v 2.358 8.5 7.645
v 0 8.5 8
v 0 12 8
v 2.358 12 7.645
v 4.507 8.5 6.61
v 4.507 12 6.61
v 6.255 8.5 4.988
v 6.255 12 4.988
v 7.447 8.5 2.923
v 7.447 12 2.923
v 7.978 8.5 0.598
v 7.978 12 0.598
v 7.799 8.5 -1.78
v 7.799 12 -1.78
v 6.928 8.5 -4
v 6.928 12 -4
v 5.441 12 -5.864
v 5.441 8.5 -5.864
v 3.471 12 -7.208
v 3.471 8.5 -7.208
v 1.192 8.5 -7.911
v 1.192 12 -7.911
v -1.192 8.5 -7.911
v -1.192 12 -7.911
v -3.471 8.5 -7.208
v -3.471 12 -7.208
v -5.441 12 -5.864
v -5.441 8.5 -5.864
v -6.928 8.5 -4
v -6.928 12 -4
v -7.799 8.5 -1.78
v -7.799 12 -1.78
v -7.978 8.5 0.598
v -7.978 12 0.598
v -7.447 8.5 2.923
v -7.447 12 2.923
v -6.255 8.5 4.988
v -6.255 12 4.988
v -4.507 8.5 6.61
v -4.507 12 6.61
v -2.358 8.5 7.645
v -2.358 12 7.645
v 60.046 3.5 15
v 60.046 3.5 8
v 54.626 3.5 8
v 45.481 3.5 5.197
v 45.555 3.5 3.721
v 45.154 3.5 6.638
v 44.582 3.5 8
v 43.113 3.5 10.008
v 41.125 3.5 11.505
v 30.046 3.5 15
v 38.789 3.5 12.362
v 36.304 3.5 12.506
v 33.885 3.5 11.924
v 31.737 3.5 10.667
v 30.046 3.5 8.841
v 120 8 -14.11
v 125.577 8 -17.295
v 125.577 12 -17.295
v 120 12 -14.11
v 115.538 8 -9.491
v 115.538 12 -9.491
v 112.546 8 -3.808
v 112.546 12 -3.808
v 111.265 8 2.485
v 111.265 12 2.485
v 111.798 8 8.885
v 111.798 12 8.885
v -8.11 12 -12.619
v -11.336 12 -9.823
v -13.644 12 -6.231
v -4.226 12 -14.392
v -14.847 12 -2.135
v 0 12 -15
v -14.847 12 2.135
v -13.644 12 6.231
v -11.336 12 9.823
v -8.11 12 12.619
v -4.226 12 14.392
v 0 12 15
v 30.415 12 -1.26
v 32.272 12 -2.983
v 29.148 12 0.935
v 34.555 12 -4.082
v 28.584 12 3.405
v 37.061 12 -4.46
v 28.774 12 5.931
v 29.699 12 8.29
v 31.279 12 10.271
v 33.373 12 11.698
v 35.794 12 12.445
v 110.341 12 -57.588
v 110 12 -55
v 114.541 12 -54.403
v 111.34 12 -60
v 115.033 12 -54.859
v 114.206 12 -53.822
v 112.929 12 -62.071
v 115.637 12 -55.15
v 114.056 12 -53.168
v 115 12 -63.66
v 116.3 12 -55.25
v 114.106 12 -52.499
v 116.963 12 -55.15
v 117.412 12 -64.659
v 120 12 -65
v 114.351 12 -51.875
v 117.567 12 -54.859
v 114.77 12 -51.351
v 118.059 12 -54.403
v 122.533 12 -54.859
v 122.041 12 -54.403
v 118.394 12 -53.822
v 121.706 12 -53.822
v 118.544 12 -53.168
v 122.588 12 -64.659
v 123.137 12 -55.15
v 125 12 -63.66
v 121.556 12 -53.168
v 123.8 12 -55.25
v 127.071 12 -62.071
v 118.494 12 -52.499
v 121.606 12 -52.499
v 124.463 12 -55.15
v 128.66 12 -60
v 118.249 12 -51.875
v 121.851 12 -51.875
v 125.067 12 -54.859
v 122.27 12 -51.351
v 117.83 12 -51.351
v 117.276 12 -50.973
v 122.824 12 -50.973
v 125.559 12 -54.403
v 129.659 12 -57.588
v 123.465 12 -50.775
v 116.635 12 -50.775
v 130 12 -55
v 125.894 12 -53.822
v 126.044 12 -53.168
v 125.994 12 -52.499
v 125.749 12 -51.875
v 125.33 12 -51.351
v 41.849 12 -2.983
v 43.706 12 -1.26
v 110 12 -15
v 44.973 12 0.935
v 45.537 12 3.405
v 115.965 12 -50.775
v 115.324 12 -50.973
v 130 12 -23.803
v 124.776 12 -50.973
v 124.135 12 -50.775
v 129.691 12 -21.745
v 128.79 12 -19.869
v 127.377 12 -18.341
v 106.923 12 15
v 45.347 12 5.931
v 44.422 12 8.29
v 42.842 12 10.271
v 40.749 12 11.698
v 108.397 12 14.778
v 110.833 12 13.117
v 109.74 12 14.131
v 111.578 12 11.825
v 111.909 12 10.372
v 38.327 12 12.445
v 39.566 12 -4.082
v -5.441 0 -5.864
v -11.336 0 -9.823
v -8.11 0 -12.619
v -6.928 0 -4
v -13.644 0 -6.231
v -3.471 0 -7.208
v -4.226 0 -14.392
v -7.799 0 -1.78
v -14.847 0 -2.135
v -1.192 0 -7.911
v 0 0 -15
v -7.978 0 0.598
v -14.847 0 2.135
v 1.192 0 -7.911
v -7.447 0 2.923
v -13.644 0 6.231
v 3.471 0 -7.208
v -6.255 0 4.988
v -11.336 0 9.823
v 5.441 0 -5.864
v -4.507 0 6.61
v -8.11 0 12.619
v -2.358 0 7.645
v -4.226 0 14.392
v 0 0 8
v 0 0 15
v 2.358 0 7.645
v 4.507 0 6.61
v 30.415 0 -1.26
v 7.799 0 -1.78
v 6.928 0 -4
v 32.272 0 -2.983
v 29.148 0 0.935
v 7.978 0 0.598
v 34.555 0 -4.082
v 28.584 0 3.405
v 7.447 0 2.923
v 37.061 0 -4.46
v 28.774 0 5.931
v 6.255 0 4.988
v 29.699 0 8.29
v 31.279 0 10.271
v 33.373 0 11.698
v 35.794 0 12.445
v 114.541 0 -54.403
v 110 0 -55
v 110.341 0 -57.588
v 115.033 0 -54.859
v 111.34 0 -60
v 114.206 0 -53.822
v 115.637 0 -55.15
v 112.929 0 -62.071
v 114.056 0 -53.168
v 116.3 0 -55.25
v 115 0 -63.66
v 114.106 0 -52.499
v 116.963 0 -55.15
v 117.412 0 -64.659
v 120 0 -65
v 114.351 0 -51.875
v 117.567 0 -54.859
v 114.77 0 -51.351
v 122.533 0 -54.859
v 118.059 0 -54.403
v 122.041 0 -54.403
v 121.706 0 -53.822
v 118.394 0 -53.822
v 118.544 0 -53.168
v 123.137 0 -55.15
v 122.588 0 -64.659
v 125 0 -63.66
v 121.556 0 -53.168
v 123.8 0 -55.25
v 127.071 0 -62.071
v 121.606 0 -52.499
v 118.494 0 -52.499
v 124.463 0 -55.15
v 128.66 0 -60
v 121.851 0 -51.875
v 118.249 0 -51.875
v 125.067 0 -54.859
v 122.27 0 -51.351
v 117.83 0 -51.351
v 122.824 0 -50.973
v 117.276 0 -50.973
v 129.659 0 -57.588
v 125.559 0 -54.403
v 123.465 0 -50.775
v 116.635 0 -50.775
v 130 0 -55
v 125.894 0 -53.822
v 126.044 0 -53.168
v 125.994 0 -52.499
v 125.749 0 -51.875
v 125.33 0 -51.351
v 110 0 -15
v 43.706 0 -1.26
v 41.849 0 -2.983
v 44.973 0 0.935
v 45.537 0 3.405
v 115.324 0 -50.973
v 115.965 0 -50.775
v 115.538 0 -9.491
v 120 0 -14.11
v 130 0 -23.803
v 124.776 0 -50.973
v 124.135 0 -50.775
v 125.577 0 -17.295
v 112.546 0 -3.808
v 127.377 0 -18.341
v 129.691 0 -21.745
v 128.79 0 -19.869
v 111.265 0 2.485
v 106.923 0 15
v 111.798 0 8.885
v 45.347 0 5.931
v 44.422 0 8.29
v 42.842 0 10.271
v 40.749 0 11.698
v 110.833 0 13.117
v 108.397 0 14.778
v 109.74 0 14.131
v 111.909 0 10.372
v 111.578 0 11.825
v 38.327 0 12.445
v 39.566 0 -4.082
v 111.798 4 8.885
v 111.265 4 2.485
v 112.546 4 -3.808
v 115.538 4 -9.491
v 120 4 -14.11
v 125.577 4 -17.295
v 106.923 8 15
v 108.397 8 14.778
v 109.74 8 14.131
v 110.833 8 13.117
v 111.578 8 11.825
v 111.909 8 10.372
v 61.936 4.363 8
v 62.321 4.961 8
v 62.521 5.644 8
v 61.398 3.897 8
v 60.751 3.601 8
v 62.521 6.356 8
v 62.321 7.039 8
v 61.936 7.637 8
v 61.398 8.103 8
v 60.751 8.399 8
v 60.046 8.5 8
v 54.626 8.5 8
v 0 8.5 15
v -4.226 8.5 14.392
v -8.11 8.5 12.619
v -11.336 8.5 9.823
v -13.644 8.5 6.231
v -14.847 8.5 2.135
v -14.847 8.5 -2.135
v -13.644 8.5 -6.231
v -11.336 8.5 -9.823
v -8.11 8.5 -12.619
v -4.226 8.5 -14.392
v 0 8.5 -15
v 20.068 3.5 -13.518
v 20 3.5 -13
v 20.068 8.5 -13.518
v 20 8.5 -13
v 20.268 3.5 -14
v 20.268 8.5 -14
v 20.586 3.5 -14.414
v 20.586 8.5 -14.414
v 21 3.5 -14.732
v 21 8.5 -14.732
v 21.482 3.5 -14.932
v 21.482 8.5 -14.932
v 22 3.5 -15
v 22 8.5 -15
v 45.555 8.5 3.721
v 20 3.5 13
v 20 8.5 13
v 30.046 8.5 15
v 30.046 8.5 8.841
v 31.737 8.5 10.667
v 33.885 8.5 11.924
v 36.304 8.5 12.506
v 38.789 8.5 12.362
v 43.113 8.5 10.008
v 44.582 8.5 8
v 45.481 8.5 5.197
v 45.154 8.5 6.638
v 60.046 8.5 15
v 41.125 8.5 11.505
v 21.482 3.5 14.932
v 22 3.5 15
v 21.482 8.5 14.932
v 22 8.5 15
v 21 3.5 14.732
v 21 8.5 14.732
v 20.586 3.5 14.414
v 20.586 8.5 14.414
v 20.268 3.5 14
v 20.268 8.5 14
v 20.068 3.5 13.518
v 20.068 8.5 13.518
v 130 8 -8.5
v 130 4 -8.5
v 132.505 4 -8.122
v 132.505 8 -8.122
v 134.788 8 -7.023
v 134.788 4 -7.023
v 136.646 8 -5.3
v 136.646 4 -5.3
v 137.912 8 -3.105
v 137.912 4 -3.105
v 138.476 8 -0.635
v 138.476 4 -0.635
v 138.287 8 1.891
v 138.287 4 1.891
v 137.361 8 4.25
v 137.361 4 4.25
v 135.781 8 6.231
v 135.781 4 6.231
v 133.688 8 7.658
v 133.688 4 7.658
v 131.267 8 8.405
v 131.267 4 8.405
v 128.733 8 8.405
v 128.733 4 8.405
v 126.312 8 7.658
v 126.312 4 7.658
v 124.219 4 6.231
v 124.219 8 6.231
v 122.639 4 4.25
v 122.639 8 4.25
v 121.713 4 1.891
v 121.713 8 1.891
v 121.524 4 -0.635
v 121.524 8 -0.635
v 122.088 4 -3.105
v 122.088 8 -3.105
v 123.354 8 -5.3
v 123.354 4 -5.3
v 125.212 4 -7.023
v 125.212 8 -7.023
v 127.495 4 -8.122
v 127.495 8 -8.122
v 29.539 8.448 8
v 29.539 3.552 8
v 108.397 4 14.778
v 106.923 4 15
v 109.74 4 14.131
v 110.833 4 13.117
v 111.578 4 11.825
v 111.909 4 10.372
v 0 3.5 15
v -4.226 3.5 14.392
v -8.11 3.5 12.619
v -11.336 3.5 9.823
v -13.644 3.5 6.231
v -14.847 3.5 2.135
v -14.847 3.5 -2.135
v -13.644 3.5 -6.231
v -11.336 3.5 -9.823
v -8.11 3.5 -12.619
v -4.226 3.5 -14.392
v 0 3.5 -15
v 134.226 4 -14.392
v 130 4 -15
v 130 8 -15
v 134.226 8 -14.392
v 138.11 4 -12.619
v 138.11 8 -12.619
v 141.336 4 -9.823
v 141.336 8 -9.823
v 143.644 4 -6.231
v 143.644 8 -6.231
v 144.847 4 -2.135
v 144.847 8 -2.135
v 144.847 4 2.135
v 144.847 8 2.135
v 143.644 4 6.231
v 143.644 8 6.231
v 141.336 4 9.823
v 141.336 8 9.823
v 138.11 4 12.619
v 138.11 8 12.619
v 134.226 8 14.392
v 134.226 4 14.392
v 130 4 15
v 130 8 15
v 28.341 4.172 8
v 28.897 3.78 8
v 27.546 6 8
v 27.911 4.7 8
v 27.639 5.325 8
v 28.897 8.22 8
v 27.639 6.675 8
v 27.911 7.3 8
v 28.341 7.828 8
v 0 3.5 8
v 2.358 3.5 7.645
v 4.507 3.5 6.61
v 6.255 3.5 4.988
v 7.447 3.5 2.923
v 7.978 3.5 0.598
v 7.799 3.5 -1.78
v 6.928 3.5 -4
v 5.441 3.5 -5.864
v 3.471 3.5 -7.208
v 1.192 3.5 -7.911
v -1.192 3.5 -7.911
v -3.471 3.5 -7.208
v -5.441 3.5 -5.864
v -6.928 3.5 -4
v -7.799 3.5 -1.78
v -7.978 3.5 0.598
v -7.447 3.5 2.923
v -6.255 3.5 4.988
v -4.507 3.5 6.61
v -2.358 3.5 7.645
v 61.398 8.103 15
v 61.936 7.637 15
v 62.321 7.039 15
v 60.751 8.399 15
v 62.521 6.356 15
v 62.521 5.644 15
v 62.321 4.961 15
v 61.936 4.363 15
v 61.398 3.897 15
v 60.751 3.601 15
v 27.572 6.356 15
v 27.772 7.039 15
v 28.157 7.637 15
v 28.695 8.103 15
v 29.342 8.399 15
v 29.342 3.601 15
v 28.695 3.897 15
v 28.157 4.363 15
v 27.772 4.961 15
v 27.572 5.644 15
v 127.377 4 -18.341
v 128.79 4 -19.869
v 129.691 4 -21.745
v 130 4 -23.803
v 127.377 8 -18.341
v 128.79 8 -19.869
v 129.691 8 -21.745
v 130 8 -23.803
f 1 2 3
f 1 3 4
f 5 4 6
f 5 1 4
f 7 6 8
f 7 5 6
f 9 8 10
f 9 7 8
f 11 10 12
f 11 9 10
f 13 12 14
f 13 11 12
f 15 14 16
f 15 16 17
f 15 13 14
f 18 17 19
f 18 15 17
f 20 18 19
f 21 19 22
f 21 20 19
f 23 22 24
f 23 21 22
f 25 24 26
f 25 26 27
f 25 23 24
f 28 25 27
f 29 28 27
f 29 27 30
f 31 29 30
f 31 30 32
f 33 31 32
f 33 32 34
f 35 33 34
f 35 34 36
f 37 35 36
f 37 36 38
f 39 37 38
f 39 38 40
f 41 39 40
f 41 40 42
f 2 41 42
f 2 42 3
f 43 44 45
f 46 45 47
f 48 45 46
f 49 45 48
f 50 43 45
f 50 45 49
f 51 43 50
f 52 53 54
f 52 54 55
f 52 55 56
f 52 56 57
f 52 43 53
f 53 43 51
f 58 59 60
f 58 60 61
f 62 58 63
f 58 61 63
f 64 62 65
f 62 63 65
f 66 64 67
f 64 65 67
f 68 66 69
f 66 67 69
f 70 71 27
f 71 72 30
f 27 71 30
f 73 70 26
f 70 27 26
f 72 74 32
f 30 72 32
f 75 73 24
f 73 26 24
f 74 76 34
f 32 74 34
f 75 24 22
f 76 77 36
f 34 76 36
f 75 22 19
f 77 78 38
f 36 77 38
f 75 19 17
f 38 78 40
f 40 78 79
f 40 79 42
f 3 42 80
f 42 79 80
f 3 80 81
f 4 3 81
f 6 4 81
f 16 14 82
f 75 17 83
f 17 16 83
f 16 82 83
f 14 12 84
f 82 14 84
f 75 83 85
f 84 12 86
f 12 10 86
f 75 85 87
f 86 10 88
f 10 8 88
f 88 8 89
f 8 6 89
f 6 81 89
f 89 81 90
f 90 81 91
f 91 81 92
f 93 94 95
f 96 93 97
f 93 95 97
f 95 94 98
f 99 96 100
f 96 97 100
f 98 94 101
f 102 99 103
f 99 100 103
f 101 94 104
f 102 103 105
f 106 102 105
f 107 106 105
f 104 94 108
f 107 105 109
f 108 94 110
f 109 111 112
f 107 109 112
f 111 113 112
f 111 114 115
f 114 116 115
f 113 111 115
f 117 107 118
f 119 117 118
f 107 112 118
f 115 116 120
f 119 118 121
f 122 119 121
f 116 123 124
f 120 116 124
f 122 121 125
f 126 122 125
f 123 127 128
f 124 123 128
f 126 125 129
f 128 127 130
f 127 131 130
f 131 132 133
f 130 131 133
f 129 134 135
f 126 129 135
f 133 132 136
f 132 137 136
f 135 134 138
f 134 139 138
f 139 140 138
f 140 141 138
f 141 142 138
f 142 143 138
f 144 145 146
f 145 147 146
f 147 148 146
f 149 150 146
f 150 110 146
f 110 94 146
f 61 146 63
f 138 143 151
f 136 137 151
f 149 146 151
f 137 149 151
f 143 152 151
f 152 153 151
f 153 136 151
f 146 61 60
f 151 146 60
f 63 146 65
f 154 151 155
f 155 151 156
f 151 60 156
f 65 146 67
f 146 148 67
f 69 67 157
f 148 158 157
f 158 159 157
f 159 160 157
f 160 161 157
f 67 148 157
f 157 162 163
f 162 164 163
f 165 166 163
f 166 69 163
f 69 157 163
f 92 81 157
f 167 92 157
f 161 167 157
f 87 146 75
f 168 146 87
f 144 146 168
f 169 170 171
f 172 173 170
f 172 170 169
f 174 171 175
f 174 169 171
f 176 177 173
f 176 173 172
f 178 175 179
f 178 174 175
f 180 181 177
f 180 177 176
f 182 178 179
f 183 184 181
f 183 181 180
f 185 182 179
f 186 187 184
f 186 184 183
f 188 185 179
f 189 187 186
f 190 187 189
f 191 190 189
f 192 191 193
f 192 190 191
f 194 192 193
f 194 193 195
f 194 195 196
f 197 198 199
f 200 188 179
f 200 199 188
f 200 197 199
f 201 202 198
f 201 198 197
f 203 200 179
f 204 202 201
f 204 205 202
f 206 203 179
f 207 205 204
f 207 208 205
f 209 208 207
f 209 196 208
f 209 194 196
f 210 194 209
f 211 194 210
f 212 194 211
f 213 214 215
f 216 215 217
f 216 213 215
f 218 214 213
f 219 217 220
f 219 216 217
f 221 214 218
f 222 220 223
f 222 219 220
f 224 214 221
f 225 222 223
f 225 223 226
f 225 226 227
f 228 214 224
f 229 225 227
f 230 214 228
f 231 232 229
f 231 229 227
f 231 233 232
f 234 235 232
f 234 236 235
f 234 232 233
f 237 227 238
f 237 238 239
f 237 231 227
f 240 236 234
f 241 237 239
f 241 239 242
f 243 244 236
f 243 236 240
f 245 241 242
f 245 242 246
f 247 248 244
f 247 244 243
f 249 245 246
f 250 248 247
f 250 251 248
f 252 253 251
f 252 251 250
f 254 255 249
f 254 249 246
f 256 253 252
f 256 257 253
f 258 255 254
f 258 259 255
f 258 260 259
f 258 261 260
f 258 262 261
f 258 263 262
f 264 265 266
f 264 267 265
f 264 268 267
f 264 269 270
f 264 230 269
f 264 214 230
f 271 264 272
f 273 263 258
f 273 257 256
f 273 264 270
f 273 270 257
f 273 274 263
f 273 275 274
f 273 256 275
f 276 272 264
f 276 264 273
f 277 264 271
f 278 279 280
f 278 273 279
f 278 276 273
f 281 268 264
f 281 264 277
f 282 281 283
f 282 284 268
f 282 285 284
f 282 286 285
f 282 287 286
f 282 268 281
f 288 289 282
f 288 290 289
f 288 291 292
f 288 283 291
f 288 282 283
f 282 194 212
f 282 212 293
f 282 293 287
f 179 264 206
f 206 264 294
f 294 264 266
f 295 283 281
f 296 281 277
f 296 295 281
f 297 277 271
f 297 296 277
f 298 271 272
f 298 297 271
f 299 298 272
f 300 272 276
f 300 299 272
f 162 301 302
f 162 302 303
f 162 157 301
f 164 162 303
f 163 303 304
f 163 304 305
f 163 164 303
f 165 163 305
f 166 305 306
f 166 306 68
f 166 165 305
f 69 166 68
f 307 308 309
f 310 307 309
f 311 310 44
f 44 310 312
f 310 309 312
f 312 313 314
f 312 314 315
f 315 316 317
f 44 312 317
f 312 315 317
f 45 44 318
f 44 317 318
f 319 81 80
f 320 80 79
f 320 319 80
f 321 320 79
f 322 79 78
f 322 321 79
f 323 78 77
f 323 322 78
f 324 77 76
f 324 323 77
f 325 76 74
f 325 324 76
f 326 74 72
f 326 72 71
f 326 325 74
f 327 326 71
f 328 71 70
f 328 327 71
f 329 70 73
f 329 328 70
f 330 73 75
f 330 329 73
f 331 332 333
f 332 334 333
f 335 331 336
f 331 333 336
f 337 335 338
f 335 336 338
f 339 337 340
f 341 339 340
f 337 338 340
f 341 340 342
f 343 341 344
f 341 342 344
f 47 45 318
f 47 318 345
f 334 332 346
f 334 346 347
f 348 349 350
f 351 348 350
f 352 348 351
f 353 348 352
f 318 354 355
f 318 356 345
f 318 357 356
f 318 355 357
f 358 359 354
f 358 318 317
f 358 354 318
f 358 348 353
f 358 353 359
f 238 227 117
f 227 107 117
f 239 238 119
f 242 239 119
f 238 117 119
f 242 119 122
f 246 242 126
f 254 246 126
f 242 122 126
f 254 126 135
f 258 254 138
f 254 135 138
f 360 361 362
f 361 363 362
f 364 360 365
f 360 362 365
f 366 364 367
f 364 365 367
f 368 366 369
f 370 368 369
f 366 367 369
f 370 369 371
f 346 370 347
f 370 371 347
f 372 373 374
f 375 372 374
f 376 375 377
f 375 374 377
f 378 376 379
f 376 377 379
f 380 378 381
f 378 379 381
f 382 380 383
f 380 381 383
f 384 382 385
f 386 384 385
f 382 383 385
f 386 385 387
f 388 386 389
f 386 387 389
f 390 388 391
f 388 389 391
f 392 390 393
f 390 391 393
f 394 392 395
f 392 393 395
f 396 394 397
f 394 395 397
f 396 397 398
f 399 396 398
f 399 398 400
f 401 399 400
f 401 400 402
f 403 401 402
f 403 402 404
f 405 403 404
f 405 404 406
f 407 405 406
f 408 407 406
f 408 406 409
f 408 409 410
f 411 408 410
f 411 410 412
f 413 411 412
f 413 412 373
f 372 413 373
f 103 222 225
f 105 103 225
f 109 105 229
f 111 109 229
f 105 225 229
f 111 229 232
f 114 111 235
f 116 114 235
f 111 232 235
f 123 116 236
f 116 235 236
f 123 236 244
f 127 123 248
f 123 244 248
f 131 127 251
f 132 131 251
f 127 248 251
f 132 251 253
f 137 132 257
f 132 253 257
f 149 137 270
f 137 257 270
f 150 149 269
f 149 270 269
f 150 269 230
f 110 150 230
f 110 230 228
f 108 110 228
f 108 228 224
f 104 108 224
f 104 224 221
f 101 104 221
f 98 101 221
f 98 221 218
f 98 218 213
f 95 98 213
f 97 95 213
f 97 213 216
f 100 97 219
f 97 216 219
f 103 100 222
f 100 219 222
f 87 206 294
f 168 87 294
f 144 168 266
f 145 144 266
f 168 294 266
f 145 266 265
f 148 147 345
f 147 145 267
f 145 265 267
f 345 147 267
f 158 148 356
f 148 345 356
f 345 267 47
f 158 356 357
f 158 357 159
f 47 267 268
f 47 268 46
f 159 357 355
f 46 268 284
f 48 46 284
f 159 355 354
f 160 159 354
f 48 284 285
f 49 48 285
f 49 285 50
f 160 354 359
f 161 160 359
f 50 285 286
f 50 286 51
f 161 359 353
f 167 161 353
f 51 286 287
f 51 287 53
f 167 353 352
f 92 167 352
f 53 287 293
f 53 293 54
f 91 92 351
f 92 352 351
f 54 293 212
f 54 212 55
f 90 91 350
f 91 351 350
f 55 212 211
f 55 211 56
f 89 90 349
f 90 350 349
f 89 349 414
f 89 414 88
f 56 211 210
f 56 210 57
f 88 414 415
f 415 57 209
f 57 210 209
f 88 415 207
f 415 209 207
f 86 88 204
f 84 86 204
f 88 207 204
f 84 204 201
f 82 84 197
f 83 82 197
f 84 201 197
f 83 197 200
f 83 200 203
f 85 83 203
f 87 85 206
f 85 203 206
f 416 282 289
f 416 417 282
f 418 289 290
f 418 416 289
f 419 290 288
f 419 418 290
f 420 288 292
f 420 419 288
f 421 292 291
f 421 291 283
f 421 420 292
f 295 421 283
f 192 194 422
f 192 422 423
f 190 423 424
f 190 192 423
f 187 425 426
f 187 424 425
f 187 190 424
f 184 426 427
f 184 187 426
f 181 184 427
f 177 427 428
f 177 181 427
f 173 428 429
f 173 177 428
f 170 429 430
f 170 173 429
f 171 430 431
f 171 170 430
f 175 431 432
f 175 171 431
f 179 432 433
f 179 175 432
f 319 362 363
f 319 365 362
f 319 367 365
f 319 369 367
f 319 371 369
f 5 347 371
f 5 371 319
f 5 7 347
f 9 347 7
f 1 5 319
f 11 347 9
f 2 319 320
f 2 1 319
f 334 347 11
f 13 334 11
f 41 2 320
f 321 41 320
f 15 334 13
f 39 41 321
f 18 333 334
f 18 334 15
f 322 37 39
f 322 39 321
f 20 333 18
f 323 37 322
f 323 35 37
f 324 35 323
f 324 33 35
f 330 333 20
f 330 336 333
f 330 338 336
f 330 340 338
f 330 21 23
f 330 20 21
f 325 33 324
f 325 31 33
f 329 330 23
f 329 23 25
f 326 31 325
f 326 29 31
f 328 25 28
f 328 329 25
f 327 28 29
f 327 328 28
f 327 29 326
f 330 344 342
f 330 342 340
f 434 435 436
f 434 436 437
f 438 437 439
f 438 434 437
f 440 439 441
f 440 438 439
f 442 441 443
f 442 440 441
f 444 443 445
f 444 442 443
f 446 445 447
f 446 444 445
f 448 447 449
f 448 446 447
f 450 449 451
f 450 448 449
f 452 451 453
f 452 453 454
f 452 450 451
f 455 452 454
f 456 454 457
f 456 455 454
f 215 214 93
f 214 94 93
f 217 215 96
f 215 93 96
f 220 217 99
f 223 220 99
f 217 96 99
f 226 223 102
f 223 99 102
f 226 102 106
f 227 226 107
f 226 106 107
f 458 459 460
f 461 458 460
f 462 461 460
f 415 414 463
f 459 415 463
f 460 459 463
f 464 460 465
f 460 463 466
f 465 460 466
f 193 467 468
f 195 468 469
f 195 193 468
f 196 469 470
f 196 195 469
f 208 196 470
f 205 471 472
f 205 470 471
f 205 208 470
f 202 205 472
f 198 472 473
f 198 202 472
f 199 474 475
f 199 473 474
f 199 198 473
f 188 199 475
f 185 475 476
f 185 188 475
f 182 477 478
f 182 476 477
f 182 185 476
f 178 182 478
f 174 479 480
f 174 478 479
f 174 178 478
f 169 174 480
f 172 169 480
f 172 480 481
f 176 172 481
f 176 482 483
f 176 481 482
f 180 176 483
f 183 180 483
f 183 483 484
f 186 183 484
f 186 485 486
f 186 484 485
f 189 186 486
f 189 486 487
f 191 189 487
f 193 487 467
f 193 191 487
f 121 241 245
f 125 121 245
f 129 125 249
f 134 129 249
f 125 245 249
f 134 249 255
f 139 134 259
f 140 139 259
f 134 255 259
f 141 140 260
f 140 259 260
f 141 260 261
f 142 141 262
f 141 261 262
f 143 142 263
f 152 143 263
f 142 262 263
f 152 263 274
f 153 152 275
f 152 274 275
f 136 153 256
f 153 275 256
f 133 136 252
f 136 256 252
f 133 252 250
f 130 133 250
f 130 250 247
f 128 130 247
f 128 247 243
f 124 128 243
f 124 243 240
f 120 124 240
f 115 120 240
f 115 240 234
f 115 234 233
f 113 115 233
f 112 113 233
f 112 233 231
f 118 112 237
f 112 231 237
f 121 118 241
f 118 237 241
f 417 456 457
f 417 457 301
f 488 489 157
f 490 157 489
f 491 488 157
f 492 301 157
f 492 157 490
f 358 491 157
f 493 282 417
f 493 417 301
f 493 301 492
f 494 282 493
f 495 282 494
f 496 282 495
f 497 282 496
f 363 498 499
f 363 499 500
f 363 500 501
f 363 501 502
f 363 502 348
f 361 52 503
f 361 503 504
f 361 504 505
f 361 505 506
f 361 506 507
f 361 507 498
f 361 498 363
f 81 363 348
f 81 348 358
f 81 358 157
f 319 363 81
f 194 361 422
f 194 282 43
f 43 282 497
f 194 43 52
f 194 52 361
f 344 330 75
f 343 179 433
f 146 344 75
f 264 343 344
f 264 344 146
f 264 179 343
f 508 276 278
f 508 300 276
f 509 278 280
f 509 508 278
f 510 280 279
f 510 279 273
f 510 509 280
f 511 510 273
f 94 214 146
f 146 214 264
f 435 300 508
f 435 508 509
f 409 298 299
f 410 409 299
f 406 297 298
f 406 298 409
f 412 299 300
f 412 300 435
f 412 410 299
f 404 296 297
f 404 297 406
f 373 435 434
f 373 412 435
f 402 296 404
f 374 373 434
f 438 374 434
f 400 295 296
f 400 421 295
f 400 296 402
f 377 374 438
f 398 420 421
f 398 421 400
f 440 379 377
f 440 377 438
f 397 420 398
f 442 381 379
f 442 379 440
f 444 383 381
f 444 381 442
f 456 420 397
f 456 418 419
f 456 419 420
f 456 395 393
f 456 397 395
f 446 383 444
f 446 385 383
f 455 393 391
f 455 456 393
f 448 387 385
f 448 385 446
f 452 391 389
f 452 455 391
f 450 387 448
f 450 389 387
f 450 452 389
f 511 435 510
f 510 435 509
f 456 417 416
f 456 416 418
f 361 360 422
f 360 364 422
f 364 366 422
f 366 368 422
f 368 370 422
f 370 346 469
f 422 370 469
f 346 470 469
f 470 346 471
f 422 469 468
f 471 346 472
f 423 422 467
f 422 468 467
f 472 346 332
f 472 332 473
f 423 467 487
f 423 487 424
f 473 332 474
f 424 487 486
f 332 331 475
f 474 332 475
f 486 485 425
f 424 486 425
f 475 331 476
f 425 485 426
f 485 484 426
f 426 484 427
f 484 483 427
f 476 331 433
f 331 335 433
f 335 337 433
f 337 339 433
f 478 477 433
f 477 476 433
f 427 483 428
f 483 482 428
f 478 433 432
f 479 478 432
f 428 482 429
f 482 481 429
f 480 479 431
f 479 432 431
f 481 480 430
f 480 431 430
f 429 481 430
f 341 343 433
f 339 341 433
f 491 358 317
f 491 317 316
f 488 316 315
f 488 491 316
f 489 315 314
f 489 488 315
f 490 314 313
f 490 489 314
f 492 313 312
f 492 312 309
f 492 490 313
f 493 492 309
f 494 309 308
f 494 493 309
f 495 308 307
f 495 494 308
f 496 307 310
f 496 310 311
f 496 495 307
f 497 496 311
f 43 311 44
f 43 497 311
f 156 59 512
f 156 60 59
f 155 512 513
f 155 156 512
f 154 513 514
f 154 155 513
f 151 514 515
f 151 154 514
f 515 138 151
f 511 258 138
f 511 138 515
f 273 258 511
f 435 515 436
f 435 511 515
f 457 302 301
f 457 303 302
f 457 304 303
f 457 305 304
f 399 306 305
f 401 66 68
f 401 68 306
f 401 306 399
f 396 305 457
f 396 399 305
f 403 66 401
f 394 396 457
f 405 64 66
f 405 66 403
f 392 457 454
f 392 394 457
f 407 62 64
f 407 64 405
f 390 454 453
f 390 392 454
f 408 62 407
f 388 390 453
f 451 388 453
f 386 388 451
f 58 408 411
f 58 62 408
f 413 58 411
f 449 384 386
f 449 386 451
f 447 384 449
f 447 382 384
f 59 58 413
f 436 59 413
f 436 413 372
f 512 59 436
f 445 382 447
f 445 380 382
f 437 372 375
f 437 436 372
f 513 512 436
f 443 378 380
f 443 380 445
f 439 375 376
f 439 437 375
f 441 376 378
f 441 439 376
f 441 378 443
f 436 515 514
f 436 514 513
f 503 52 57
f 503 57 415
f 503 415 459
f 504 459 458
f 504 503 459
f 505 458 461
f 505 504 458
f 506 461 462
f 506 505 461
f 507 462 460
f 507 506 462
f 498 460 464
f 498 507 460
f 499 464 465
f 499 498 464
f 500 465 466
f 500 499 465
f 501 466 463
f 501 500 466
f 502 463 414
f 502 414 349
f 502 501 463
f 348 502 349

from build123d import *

# Parameters (mm, degrees)
SKETCH1_R           = 8
BOSS_EXTRUDE1_DEPTH = 12
SKETCH3_W           = 35
SKETCH3_H           = 5
CUT_EXTRUDE1_DEPTH  = 30
SKETCH4_W           = 20
SKETCH4_H           = 50
BOSS_EXTRUDE2_DEPTH = 12
FILLET1_R           = 10
FILLET2_R           = 10
SKETCH7_R           = 8.5
CUT_EXTRUDE4_DEPTH  = 12
SKETCH8_R           = 22.712934263
CUT_EXTRUDE5_DEPTH  = 4
CUT_EXTRUDE6_START  = -4
SKETCH9_R           = 22.712934263
CUT_EXTRUDE6_DEPTH  = 4
SKETCH14_R          = 2.25
CUT_EXTRUDE7_DEPTH  = 12
FILLET3_R           = 5
FILLET4_R           = 5
SKETCH15_R          = 8.5
CUT_EXTRUDE8_DEPTH  = 12
CUT_EXTRUDE9_DEPTH  = 7
CHAMFER1_START      = 3.5
CHAMFER1_DEPTH      = 5
FILLET6_R           = 7
FILLET7_R           = 7
FILLET9_R           = 2
FILLET10_R          = 2


with BuildPart() as part:
    # Sketch1 → Boss-Extrude1 (new body)
    with BuildSketch(Plane(origin=(0, 0, 0), x_dir=(1, 0, 0), z_dir=(0, 1, 0))):
        with BuildLine():
            Line((0, 15), (130, 15))
            ThreePointArc((130, 15), (145, 0), (130, -15))
            Line((130, -15), (0, -15))
            ThreePointArc((0, -15), (-15, 0), (0, 15))
        make_face()
        with Locations(Location((0, 0, 0), (0, 0, 270))):
            Circle(SKETCH1_R, mode=Mode.SUBTRACT)
    extrude(amount=BOSS_EXTRUDE1_DEPTH)

    # Sketch3 → Cut-Extrude1 (cut)
    with BuildSketch(Plane(origin=(0, 0, -15), x_dir=(-1, 0, 0), z_dir=(0, 0, -1))):
        with Locations((-2.5, 6)):
            Rectangle(SKETCH3_W, SKETCH3_H)
    extrude(amount=-CUT_EXTRUDE1_DEPTH, mode=Mode.SUBTRACT)

    # Sketch4 → Boss-Extrude2 (add)
    with BuildSketch(Plane.XZ):
        with Locations((120, -40)):
            Rectangle(SKETCH4_W, SKETCH4_H)
    extrude(amount=-BOSS_EXTRUDE2_DEPTH)

    # Fillet1
    fillet1_edges = [part.edges().sort_by_distance(p)[0] for p in [
        (110, 6, -65),
    ]]
    fillet(fillet1_edges, radius=FILLET1_R)

    # Fillet2
    fillet2_edges = [part.edges().sort_by_distance(p)[0] for p in [
        (130, 6, -65),
    ]]
    fillet(fillet2_edges, radius=FILLET2_R - 0.0001)  # a hair under: the kernel refuses the full size

    # Sketch7 → Cut-Extrude4 (cut)
    with BuildSketch(Plane.XZ):
        with Locations(Location((130, 0, 0), (0, 0, 270))):
            Circle(SKETCH7_R)
    extrude(amount=-CUT_EXTRUDE4_DEPTH, mode=Mode.SUBTRACT)

    # Sketch8 → Cut-Extrude5 (cut)
    with BuildSketch(Plane(origin=(0, 12, 0), x_dir=(1, 0, 0), z_dir=(0, 1, 0))):
        with Locations((133.938996952, -3.822545113)):
            Circle(SKETCH8_R)
    extrude(amount=-CUT_EXTRUDE5_DEPTH, mode=Mode.SUBTRACT)

    # Sketch9 → Cut-Extrude6 (cut)
    with BuildSketch(Plane.XZ.offset(CUT_EXTRUDE6_START)):
        with Locations((133.938996952, 3.822545113)):
            Circle(SKETCH9_R)
    extrude(amount=CUT_EXTRUDE6_DEPTH, mode=Mode.SUBTRACT)

    # Sketch14 → Cut-Extrude7 (cut)
    with BuildSketch(Plane.XZ):
        with Locations(Location((116.3, -53, 0), (0, 0, 270))):
            Circle(SKETCH14_R)
        with Locations(Location((123.8, -53, 0), (0, 0, 270))):
            Circle(SKETCH14_R)
    extrude(amount=-CUT_EXTRUDE7_DEPTH, mode=Mode.SUBTRACT)

    # Fillet3
    fillet3_edges = [part.edges().sort_by_distance(p)[0] for p in [
        (114.166746572, 10, 15),
    ]]
    fillet(fillet3_edges, radius=FILLET3_R)

    # Fillet4
    fillet4_edges = [part.edges().sort_by_distance(p)[0] for p in [
        (114.166746572, 2, 15),
    ]]
    fillet(fillet4_edges, radius=FILLET4_R)

    # Sketch15 → Cut-Extrude8 (cut)
    with BuildSketch(Plane.XZ):
        with Locations(Location((37.060545973, 4.039960241, 0), (0, 0, 270))):
            Circle(SKETCH15_R)
    extrude(amount=-CUT_EXTRUDE8_DEPTH, mode=Mode.SUBTRACT)

    # Sketch16 → Cut-Extrude9 (cut)
    with BuildSketch(Plane.XY.offset(15)):
        with BuildLine():
            Line((60.046424392, 3.5), (30.046424392, 3.5))
            ThreePointArc((30.046424392, 3.5), (27.546424392, 6), (30.046424392, 8.5))
            Line((30.046424392, 8.5), (60.046424392, 8.5))
            ThreePointArc((60.046424392, 8.5), (62.546424392, 6), (60.046424392, 3.5))
        make_face()
    extrude(amount=-CUT_EXTRUDE9_DEPTH, mode=Mode.SUBTRACT)

    # Chamfer1: read off the stored shape, not the designer's step
    # Chamfer1 outline → Chamfer1 (cut)
    with BuildSketch(Plane(origin=(0, 0, 0), x_dir=(1, 0, 0), z_dir=(0, 1, 0)).offset(CHAMFER1_START)):
        with BuildLine():
            Line((44.581721752, -8), (54.625922679, -8))
            Line((54.625922679, -8), (45.554566675, -3.721193369))
            ThreePointArc((45.554566675, -3.721193369), (45.349012425, -5.924455895), (44.581721752, -8))
        make_face()
    extrude(amount=CHAMFER1_DEPTH, mode=Mode.SUBTRACT)

    # Fillet6
    fillet6_edges = [part.edges().sort_by_distance(p)[0] for p in [
        (130, 2, -18.546220742),
    ]]
    fillet(fillet6_edges, radius=FILLET6_R)

    # Fillet7
    fillet7_edges = [part.edges().sort_by_distance(p)[0] for p in [
        (130, 10, -18.546220742),
    ]]
    fillet(fillet7_edges, radius=FILLET7_R)

    # Fillet9
    fillet9_edges = [part.edges().sort_by_distance(p)[0] for p in [
        (20, 6, -15),
    ]]
    fillet(fillet9_edges, radius=FILLET9_R)

    # Fillet10
    fillet10_edges = [part.edges().sort_by_distance(p)[0] for p in [
        (20, 6, 15),
    ]]
    fillet(fillet10_edges, radius=FILLET10_R)


solid = part.part
